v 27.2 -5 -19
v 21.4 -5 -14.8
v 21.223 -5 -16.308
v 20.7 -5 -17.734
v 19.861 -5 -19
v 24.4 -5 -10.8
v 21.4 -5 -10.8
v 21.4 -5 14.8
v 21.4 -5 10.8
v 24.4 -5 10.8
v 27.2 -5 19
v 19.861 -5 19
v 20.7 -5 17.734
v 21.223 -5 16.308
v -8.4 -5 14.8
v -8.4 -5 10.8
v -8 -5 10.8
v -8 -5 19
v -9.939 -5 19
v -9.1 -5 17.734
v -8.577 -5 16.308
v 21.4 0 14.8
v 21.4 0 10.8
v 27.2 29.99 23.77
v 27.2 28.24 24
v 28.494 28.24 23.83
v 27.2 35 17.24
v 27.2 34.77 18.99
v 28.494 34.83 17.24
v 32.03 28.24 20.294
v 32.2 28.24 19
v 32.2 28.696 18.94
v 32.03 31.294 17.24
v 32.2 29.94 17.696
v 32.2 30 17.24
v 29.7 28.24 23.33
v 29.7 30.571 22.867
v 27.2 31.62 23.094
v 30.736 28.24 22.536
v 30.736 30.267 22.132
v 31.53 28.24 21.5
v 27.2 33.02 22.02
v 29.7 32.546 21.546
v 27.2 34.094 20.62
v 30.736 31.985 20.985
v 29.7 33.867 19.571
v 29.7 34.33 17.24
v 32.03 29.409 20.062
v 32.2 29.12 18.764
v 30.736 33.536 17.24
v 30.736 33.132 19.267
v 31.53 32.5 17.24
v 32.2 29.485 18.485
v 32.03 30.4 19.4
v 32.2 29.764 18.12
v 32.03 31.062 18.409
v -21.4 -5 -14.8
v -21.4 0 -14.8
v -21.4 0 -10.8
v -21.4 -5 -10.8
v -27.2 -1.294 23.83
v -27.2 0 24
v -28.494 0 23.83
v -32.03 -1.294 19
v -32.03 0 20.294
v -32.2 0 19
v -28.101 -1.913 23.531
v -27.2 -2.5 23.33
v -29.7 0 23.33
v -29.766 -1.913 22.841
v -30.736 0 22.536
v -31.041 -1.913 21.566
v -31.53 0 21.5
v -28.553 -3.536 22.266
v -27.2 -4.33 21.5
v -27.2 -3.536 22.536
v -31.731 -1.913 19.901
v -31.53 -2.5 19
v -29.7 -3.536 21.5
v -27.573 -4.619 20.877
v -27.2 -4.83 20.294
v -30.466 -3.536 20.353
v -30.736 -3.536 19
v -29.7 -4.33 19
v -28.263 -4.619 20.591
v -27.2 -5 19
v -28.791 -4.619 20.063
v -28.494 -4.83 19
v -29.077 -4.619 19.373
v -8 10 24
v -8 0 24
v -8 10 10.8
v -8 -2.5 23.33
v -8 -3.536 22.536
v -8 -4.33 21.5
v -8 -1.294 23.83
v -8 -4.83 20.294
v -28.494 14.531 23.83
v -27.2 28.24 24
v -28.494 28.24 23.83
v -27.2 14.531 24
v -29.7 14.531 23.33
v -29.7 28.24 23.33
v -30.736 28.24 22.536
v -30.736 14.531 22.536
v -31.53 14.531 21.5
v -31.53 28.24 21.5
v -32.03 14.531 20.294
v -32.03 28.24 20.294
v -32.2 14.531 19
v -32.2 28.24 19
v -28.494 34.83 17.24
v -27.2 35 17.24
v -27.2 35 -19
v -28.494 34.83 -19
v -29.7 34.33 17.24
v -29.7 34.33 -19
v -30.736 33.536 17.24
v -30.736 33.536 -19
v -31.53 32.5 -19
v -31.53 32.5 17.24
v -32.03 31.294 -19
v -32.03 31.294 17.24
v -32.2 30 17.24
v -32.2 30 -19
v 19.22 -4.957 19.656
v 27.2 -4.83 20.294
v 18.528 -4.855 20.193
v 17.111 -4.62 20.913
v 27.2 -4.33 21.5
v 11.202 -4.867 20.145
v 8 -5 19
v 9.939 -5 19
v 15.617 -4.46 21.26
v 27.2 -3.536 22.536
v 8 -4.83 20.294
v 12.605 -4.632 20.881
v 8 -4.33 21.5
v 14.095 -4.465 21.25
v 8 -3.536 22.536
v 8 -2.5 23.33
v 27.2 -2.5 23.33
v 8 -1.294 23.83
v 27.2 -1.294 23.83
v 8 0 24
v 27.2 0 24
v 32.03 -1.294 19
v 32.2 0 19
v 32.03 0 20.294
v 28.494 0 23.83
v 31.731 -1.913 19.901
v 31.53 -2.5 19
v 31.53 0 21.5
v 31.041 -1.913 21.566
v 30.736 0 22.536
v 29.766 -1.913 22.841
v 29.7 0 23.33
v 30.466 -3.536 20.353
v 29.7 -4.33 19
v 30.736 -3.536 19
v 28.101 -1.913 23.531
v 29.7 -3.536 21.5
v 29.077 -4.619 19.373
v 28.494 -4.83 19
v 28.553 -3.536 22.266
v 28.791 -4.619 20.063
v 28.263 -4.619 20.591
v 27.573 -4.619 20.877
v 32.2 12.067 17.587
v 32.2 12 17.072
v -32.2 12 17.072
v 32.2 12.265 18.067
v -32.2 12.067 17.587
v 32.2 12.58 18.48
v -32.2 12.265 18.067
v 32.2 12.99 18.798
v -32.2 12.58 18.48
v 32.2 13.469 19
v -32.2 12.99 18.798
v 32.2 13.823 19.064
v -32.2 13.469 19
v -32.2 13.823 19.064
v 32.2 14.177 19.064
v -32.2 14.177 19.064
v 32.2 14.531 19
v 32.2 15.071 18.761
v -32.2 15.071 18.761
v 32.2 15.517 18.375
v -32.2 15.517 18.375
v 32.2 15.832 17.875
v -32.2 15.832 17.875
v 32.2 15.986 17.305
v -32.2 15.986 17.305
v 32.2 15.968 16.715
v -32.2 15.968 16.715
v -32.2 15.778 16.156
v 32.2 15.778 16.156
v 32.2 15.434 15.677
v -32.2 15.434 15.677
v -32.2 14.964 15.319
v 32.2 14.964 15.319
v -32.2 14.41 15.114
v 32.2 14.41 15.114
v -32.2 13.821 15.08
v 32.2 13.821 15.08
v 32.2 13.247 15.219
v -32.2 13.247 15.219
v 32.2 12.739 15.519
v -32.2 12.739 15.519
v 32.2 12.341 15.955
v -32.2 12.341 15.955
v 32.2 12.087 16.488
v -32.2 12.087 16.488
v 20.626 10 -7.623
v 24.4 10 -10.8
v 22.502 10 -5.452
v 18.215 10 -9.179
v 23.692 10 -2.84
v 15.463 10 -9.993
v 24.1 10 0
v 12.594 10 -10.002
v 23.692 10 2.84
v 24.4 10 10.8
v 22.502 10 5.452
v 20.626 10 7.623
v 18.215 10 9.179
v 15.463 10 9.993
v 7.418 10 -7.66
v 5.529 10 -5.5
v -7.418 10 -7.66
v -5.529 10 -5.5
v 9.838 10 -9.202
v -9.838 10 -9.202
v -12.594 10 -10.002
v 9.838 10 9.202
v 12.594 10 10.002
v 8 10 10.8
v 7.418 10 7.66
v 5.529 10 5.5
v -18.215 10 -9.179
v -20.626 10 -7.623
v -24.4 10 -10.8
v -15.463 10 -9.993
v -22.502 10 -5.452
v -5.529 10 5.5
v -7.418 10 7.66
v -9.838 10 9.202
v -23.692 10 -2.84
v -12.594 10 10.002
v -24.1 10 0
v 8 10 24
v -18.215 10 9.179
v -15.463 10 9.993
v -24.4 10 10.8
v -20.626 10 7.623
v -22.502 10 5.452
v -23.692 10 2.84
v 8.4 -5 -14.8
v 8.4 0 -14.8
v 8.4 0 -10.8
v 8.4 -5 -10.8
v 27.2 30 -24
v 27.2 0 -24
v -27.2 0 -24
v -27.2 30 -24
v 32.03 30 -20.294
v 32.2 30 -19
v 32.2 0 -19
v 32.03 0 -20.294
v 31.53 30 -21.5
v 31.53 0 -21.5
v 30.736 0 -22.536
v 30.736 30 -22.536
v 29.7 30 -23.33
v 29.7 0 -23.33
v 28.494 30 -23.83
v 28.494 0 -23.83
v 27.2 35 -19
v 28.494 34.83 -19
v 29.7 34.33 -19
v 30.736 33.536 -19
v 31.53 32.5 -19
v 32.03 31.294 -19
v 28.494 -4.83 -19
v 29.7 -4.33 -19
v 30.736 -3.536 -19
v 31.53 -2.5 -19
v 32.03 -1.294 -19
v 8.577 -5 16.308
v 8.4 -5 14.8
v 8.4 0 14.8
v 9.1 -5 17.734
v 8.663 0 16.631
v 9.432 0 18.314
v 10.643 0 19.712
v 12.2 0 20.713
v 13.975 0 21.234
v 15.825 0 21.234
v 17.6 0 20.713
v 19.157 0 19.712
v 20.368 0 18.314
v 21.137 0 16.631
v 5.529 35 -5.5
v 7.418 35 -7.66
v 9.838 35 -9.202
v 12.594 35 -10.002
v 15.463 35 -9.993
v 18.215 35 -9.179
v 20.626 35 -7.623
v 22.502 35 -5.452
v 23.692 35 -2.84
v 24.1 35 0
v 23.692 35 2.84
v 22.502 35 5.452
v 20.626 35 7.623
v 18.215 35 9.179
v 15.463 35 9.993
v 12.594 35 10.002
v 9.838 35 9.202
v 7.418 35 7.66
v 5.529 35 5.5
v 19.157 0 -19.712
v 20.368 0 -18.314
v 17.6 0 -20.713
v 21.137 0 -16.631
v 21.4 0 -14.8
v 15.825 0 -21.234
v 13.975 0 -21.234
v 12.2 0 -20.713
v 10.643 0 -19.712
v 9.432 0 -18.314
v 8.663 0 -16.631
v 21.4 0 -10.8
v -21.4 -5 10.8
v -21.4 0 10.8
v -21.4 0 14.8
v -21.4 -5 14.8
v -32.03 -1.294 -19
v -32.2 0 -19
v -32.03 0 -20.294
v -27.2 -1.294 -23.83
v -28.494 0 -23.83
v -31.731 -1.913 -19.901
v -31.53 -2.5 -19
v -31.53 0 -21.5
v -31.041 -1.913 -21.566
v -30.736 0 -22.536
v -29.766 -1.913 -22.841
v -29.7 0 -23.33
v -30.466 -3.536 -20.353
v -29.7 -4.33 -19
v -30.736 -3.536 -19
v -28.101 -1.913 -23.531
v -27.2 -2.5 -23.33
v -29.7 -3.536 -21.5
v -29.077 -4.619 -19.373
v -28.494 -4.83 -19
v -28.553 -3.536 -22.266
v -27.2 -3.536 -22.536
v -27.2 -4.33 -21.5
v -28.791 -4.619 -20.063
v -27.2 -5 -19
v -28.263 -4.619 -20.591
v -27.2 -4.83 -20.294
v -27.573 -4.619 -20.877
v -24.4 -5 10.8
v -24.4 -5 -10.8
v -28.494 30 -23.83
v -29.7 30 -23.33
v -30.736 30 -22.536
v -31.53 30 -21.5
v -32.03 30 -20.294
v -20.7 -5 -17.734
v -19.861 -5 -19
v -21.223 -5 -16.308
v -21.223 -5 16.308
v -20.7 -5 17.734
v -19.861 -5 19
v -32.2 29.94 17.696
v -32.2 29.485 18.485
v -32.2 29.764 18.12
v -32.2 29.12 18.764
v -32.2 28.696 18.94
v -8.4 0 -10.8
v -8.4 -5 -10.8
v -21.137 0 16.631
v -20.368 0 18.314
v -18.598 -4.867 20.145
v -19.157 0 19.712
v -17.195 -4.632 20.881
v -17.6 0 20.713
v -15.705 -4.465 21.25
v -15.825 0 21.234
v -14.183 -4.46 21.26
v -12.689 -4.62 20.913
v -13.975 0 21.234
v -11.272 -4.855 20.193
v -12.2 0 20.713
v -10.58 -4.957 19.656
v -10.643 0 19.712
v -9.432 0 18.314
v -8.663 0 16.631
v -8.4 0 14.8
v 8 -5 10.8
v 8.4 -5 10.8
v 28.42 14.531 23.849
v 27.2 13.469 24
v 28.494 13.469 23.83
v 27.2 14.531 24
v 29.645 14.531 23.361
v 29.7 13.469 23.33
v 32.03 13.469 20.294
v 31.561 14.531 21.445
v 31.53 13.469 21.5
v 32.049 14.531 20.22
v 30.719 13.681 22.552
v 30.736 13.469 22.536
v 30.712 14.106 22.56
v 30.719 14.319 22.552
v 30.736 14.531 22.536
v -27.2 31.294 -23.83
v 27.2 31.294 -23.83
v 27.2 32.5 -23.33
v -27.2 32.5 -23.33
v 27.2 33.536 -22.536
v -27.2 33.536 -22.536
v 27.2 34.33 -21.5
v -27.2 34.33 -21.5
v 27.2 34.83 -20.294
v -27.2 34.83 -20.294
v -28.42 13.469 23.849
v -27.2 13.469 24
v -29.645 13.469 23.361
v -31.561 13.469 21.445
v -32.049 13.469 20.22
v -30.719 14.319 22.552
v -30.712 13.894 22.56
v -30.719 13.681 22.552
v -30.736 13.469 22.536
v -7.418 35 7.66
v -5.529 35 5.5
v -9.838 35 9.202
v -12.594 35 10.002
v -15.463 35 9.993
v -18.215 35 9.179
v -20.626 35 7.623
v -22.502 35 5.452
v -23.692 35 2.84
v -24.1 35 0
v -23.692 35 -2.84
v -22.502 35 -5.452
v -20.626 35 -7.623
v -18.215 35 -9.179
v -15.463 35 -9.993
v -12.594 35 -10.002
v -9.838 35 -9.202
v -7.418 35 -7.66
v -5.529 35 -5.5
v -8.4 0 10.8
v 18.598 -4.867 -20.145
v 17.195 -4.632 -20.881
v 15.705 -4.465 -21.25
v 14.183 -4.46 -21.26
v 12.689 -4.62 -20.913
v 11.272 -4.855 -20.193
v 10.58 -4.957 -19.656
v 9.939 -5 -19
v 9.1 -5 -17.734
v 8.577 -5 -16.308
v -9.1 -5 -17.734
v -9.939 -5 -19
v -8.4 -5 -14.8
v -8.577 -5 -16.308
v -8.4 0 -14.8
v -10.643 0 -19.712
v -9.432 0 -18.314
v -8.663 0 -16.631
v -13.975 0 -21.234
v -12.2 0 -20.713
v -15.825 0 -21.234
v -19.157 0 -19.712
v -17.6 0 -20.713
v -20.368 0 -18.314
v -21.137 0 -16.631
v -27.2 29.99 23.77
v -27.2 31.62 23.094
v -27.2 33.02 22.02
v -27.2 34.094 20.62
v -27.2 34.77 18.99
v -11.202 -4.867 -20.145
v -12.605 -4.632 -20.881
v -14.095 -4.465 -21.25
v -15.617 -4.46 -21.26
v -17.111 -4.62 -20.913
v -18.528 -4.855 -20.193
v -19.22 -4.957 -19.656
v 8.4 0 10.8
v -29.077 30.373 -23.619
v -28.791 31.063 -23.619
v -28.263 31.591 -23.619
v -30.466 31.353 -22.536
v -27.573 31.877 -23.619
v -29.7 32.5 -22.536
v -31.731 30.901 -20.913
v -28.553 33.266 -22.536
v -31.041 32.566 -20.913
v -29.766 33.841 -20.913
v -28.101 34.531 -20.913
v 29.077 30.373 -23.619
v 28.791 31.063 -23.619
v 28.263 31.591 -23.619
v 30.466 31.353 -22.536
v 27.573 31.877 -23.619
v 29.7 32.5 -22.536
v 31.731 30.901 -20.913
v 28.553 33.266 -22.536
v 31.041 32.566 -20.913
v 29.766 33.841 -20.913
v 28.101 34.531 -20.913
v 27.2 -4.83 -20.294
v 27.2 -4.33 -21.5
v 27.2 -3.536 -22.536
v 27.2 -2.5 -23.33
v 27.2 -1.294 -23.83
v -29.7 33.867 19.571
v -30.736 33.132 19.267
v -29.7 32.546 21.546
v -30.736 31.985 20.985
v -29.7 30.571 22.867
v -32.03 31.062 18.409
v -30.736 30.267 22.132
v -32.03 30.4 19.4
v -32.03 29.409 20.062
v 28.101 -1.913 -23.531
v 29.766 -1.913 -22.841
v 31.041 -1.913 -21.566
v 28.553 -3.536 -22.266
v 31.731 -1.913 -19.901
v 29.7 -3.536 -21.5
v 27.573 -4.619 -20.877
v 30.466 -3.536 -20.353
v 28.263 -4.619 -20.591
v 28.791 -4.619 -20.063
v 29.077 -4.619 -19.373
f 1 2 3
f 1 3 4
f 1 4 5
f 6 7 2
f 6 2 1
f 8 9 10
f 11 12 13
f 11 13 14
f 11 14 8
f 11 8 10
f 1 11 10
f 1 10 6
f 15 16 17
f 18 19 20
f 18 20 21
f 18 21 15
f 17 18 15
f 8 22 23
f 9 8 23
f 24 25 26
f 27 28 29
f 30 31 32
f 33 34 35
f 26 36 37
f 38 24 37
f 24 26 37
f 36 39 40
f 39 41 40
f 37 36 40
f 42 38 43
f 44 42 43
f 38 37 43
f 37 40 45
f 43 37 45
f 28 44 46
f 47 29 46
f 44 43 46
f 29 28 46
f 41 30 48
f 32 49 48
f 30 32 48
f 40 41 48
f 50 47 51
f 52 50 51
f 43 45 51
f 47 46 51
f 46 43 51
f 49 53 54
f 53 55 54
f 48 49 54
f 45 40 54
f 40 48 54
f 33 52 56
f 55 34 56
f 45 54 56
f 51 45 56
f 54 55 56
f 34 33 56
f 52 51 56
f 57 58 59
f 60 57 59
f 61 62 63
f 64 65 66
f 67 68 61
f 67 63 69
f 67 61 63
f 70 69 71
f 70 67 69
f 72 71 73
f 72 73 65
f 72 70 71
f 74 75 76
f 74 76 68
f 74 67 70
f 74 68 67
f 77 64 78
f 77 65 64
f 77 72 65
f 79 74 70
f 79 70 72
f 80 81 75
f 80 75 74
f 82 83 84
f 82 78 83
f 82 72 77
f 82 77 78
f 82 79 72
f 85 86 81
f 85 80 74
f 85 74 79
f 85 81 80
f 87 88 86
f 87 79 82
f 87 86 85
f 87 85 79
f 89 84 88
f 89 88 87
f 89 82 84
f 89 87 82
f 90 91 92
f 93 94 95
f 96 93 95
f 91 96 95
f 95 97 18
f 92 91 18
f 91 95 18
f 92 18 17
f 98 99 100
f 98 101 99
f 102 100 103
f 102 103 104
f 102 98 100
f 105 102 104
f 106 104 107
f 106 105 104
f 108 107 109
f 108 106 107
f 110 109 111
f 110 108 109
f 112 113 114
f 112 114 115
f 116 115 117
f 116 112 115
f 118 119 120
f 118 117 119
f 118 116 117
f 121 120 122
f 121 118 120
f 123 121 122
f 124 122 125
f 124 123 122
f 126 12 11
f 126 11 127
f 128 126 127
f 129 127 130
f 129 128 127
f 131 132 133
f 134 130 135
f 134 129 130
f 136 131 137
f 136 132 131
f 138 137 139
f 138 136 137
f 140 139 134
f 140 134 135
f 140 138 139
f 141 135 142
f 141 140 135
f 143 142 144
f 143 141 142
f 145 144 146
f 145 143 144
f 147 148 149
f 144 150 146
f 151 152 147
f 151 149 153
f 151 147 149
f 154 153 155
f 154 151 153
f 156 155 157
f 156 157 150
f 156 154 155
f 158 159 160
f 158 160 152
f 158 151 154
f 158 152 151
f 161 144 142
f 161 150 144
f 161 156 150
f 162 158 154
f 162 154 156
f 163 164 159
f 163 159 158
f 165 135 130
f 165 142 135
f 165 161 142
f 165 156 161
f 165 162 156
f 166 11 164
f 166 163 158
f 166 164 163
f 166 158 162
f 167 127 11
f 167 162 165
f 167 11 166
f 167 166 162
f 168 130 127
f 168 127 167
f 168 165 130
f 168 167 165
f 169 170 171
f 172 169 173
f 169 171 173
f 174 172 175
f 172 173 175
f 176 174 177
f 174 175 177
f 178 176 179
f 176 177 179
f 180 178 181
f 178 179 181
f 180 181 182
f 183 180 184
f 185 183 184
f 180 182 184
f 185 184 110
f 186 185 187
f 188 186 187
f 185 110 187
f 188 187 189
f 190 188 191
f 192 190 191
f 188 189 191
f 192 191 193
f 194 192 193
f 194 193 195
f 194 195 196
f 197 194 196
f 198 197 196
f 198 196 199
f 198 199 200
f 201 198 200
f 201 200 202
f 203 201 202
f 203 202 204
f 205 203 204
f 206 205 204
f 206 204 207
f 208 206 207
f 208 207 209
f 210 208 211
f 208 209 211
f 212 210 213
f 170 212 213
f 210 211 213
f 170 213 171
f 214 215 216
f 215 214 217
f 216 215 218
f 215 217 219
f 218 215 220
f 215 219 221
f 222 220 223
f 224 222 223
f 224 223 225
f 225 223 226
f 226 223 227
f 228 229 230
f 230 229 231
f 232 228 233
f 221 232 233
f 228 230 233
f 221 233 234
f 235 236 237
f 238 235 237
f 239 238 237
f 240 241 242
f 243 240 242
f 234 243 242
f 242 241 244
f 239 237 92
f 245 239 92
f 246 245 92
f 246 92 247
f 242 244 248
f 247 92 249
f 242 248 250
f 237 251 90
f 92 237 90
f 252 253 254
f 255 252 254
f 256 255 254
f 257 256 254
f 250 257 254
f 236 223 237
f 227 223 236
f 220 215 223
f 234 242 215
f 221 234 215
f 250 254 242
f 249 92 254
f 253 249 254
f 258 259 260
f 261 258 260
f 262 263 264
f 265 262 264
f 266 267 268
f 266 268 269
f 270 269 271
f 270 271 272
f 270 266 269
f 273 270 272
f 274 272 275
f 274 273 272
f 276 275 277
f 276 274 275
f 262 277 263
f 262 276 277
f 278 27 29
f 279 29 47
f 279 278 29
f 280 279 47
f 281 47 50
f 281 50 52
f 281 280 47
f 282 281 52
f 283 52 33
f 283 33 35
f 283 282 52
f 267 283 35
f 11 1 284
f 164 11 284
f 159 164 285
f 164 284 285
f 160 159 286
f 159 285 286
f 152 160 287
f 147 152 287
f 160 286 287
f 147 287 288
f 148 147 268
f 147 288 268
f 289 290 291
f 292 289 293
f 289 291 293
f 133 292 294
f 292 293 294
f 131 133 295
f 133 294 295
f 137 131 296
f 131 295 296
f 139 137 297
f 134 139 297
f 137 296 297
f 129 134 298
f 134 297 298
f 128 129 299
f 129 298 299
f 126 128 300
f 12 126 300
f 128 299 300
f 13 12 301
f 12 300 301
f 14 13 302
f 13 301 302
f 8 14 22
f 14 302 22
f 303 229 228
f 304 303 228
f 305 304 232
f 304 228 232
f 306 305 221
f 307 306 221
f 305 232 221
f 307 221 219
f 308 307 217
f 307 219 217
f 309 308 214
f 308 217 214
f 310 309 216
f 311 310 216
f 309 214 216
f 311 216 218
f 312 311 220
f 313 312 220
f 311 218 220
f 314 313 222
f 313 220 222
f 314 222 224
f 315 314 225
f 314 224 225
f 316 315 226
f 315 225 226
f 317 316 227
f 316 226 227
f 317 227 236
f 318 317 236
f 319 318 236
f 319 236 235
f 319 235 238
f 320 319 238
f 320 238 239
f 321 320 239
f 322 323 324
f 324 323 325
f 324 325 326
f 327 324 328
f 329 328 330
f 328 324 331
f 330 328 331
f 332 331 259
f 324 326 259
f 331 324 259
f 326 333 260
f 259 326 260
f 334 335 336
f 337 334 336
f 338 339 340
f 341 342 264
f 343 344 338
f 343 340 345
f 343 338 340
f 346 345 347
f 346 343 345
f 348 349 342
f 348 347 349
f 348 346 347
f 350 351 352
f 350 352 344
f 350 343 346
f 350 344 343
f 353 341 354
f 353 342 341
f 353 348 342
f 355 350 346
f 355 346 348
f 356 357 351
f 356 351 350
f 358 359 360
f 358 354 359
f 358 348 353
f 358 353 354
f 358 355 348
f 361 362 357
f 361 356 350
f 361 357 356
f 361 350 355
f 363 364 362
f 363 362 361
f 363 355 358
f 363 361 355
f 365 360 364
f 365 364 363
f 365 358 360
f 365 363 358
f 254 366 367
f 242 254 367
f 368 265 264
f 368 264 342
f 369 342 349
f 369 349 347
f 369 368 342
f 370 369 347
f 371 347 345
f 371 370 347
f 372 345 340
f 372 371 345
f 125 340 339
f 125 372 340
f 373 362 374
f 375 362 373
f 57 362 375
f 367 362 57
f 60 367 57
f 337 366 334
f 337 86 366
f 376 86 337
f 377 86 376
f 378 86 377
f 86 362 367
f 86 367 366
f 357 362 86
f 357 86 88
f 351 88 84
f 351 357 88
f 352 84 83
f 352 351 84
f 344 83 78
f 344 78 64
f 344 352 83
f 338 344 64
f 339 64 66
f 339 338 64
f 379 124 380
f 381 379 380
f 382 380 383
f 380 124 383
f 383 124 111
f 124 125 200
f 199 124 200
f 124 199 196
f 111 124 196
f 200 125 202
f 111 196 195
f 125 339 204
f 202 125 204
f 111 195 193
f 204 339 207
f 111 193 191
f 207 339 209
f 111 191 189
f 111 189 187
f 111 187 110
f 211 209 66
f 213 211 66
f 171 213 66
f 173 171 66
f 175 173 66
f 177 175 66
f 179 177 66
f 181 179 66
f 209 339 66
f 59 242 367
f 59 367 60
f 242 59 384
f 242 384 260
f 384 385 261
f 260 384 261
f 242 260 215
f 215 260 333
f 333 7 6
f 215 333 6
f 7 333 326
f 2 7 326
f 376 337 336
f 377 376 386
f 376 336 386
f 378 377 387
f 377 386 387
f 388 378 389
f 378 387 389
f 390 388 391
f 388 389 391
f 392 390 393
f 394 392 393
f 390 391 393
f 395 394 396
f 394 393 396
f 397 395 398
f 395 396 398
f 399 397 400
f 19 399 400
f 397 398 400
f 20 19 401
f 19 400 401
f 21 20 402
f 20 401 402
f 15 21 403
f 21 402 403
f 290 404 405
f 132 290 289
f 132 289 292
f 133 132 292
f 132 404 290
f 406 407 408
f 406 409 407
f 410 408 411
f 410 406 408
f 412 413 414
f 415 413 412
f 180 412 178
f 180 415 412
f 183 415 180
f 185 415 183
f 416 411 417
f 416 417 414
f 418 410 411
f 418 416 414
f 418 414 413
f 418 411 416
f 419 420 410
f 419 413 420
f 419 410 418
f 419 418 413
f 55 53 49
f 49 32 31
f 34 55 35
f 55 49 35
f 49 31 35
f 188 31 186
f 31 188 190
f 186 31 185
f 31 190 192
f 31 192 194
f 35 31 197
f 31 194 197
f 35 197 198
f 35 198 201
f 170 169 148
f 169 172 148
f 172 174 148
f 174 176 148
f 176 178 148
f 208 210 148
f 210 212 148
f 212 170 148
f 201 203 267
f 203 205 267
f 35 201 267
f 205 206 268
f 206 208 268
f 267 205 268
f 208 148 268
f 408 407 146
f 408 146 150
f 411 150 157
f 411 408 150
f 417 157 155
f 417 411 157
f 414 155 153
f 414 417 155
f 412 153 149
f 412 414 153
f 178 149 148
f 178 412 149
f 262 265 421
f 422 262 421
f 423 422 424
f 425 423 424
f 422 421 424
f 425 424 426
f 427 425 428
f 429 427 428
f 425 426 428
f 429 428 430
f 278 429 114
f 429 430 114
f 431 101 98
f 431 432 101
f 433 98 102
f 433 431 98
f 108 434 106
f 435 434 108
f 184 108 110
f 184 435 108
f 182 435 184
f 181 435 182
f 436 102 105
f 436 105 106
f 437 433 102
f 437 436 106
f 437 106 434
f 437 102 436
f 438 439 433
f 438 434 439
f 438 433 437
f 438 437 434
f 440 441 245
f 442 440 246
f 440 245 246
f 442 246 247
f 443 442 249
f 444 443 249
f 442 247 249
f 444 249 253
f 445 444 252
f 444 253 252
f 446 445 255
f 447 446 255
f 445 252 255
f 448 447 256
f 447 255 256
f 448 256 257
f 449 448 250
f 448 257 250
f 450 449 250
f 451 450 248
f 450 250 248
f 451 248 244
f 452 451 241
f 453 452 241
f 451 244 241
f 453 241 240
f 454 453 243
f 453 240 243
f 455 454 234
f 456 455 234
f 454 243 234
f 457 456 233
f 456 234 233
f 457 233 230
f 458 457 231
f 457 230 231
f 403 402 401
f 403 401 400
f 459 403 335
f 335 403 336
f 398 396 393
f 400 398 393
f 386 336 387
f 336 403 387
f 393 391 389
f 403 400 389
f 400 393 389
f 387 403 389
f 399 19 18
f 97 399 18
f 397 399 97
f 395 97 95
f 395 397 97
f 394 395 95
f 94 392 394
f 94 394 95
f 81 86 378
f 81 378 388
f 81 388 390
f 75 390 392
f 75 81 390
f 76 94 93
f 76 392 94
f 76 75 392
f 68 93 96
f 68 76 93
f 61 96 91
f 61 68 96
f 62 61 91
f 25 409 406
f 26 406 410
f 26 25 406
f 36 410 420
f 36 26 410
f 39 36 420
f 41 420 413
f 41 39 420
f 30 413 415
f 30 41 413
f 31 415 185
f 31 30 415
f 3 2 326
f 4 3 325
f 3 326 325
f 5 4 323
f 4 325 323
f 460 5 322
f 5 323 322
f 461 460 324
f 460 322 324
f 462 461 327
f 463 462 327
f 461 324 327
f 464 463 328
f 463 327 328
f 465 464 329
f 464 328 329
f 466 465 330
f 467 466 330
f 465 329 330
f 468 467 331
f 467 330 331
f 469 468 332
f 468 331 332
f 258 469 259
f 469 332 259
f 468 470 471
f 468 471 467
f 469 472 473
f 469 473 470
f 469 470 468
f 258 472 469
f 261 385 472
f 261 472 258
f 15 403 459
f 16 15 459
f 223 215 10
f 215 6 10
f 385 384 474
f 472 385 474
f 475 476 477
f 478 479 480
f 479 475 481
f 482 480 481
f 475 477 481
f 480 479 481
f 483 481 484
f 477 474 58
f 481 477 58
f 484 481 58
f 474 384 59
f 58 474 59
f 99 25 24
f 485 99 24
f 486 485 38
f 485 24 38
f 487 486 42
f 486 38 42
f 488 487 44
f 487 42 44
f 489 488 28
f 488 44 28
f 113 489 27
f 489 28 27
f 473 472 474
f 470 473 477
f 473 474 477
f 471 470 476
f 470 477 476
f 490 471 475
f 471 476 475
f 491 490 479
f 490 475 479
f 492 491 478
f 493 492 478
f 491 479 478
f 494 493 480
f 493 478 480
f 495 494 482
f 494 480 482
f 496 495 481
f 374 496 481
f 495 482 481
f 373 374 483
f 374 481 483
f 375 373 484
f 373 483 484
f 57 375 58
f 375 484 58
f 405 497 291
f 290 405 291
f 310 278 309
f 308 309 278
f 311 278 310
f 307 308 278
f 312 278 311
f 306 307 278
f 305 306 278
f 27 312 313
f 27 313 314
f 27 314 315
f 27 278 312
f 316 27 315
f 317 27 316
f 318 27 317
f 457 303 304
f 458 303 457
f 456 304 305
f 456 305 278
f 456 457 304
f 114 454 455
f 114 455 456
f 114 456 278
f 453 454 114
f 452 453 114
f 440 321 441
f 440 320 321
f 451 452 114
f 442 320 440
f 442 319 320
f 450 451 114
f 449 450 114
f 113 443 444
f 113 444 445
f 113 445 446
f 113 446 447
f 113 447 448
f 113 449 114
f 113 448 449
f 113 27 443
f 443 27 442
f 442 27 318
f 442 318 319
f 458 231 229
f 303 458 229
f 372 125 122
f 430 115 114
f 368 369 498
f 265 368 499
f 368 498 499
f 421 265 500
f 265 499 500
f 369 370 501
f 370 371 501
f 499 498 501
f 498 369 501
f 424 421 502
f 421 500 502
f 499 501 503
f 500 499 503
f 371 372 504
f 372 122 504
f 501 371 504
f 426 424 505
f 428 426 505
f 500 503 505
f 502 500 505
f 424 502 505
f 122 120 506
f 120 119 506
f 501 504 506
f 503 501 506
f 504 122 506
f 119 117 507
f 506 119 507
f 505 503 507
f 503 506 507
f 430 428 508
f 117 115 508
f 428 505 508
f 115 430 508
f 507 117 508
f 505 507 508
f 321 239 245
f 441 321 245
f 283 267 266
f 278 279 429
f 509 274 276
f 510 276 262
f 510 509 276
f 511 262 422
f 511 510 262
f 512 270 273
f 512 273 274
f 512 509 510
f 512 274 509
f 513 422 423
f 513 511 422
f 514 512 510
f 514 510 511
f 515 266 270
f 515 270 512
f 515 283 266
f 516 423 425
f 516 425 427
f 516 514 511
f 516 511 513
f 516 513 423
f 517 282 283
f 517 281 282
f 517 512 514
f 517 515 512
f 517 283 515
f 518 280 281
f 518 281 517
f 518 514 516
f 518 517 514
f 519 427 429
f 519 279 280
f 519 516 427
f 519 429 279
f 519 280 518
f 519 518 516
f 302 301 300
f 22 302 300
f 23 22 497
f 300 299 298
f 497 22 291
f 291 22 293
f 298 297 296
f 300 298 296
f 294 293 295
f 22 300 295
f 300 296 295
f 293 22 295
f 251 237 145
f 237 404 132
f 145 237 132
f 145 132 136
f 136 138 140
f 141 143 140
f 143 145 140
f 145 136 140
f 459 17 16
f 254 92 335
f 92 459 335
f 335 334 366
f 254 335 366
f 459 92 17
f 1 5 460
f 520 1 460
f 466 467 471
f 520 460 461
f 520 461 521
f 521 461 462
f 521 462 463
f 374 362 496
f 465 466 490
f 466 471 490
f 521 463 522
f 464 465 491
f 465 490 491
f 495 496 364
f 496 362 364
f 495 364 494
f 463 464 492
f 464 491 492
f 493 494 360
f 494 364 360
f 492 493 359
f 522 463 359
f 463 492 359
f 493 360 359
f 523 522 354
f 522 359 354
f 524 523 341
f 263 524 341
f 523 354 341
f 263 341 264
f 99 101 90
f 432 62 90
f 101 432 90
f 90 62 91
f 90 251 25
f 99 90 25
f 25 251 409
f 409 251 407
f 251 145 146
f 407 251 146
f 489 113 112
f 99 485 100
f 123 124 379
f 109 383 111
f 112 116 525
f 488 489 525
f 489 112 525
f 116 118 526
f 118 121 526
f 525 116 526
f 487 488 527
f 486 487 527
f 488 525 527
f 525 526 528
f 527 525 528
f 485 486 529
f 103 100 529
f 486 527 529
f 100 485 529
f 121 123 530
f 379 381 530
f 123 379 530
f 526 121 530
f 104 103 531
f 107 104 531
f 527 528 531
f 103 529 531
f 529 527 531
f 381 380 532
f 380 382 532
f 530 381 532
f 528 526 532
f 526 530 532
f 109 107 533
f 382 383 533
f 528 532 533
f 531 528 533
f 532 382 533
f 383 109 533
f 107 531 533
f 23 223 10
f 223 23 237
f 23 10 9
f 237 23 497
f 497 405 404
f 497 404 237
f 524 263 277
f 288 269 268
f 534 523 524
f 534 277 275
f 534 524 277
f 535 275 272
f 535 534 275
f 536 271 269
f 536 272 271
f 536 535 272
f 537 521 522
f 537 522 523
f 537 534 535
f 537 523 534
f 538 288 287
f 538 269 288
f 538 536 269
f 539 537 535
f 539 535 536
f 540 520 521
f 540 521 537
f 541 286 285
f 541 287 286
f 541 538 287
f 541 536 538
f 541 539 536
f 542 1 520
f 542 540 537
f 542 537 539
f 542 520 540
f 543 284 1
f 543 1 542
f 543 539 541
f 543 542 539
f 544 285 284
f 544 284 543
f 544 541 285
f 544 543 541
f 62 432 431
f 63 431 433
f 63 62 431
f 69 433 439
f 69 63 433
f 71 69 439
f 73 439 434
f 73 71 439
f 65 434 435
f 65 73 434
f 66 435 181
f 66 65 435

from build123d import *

# Parameters (mm, degrees)
F1_DEPTH      = 5
F3_DEPTH      = 10
F5_DEPTH      = 25
F7_R          = 6.7597979746
F6_R          = 2
F8_DEPTH      = 69.4
F9_R          = 5
F10_R         = 5
F11_T1_DEPTH  = 44.2
F11_T3_DEPTH  = 44.2
F12_T1_DEPTH  = 54.4
F12_T3_DEPTH  = 30
F12_T5_DEPTH  = 38
F12_S9_W      = 5
F12_S9_H      = 5
F12_T10_DEPTH = 5
F12_S15_W     = 5
F12_S15_H     = 5
F12_T16_DEPTH = 5
F12_S21_W     = 5
F12_S21_H     = 5
F12_T22_DEPTH = 5
F12_S27_W     = 5
F12_S27_H     = 5
F12_T28_DEPTH = 5
F12_T32_ANGLE = 90
F12_T34_ANGLE = 90


# Not quite as in the source:
# - a fillet or chamfer that OpenCascade refuses, or shapes differently, is made with other operations: its cross-section is extruded or revolved along the edge and cut away or added


with BuildPart() as f1:
    # F0 (on Front) → F1 (new body)
    with BuildSketch(Plane.XZ):
        with BuildLine():
            Line((32.2, -24), (32.2, 24))
            Line((32.2, 24), (8, 24))
            Line((8, 24), (8, 10.8))
            Line((8, 10.8), (8.4, 10.8))
            Line((8.4, 10.8), (8.4, 14.8))
            ThreePointArc((8.4, 14.8), (14.9, 21.3), (21.4, 14.8))
            Line((21.4, 14.8), (21.4, 10.8))
            Line((21.4, 10.8), (24.4, 10.8))
            Line((24.4, 10.8), (24.4, -10.8))
            Line((24.4, -10.8), (21.4, -10.8))
            Line((21.4, -10.8), (21.4, -14.8))
            ThreePointArc((21.4, -14.8), (14.9, -21.3), (8.4, -14.8))
            Line((8.4, -14.8), (8.4, -10.8))
            Line((8.4, -10.8), (-8.4, -10.8))
            Line((-8.4, -10.8), (-8.4, -14.8))
            ThreePointArc((-8.4, -14.8), (-14.9, -21.3), (-21.4, -14.8))
            Line((-21.4, -14.8), (-21.4, -10.8))
            Line((-21.4, -10.8), (-24.4, -10.8))
            Line((-24.4, -10.8), (-24.4, 10.8))
            Line((-24.4, 10.8), (-21.4, 10.8))
            Line((-21.4, 10.8), (-21.4, 14.8))
            ThreePointArc((-21.4, 14.8), (-14.9, 21.3), (-8.4, 14.8))
            Line((-8.4, 14.8), (-8.4, 10.8))
            Line((-8.4, 10.8), (-8, 10.8))
            Line((-8, 10.8), (-8, 24))
            Line((-8, 24), (-32.2, 24))
            Line((-32.2, 24), (-32.2, -24))
            Line((-32.2, -24), (32.2, -24))
        make_face()
    extrude(amount=F1_DEPTH)

    # F2 (on face) → F3 (join)
    with BuildSketch(Plane(origin=(0, 0, 0), x_dir=(-1, 0, 0), z_dir=(0, 1, 0))):
        with BuildLine():
            Line((24.4, 10.8), (24.4, -10.8))
            Line((24.4, -10.8), (21.4, -10.8))
            Line((21.4, -10.8), (21.4, -14.8))
            ThreePointArc((21.4, -14.8), (14.9, -21.3), (8.4, -14.8))
            Line((8.4, -14.8), (8.4, -10.8))
            Line((8.4, -10.8), (-8.4, -10.8))
            Line((-8.4, -10.8), (-8.4, -14.8))
            ThreePointArc((-8.4, -14.8), (-14.9, -21.3), (-21.4, -14.8))
            Line((-21.4, -14.8), (-21.4, -10.8))
            Line((-21.4, -10.8), (-24.4, -10.8))
            Line((-24.4, -10.8), (-24.4, 10.8))
            Line((-24.4, 10.8), (-21.4, 10.8))
            Line((-21.4, 10.8), (-21.4, 14.8))
            ThreePointArc((-21.4, 14.8), (-14.9, 21.3), (-8.4, 14.8))
            Line((-8.4, 14.8), (-8.4, 10.8))
            Line((-8.4, 10.8), (-8, 10.8))
            Line((-8, 10.8), (-8, 24))
            Line((-8, 24), (-32.2, 24))
            Line((-32.2, 24), (-32.2, -24))
            Line((-32.2, -24), (32.2, -24))
            Line((32.2, -24), (32.2, 24))
            Line((32.2, 24), (8, 24))
            Line((8, 24), (8, 10.8))
            Line((8, 10.8), (8.4, 10.8))
            Line((8.4, 10.8), (8.4, 14.8))
            ThreePointArc((8.4, 14.8), (14.9, 21.3), (21.4, 14.8))
            Line((21.4, 14.8), (21.4, 10.8))
            Line((21.4, 10.8), (24.4, 10.8))
        make_face()
        with BuildLine():
            Line((21.4, -14.8), (21.4, -10.8))
            Line((21.4, -10.8), (8.4, -10.8))
            Line((8.4, -10.8), (8.4, -14.8))
            ThreePointArc((8.4, -14.8), (14.9, -21.3), (21.4, -14.8))
        make_face()
        with BuildLine():
            Line((-8.4, -14.8), (-8.4, -10.8))
            Line((-8.4, -10.8), (-21.4, -10.8))
            Line((-21.4, -10.8), (-21.4, -14.8))
            ThreePointArc((-21.4, -14.8), (-14.9, -21.3), (-8.4, -14.8))
        make_face()
        with BuildLine():
            Line((8.4, 10.8), (21.4, 10.8))
            Line((21.4, 10.8), (21.4, 14.8))
            ThreePointArc((21.4, 14.8), (14.9, 21.3), (8.4, 14.8))
            Line((8.4, 14.8), (8.4, 10.8))
        make_face()
        with BuildLine():
            Line((-21.4, 10.8), (-8.4, 10.8))
            Line((-8.4, 10.8), (-8.4, 14.8))
            ThreePointArc((-8.4, 14.8), (-14.9, 21.3), (-21.4, 14.8))
            Line((-21.4, 14.8), (-21.4, 10.8))
        make_face()
    extrude(amount=F3_DEPTH)

    # F4 (on face) → F5 (join)
    with BuildSketch(Plane(origin=(0, 10, 0), x_dir=(-1, 0, 0), z_dir=(0, 1, 0))):
        Polygon((32.2, -24), (32.2, 24), (8, 24), (8, 10.8), (24.4, 10.8), (24.4, -10.8), (-24.4, -10.8), (-24.4, 10.8), (-8, 10.8), (-8, 24), (-32.2, 24), (-32.2, -24), align=None)
        Polygon((8, 10.8), (8, 24), (-8, 24), (-8, 10.8), (-24.4, 10.8), (-24.4, -10.8), (24.4, -10.8), (24.4, 10.8), align=None)
        with BuildLine():
            ThreePointArc((5.5288725662, 5.5), (16.8680666762, 9.6842239514), (24.1, 0))
            ThreePointArc((24.1, 0), (16.8680666762, -9.6842239514), (5.5288725662, -5.5))
            Line((5.5288725662, -5.5), (0, -5.5))
            Line((0, -5.5), (-5.5288725662, -5.5))
            ThreePointArc((-5.5288725662, -5.5), (-24.1, 0), (-5.5288725662, 5.5))
            Line((-5.5288725662, 5.5), (0, 5.5))
            Line((0, 5.5), (5.5288725662, 5.5))
        make_face(mode=Mode.SUBTRACT)
    extrude(amount=F5_DEPTH)

    # F7
    f7_edges = [f1.edges().sort_by_distance(p)[0] for p in [
        (0, 35, 24),
    ]]
    fillet(f7_edges, radius=F7_R)

    # F6 (on face) → F8 (cut)
    with BuildSketch(Plane(origin=(-32.2, 0, 0), x_dir=(0, -1, 0), z_dir=(-1, 0, 0))):
        with Locations((-14, 17.0717967697)):
            Circle(F6_R)
    extrude(amount=-F8_DEPTH, mode=Mode.SUBTRACT)

    # F9
    f9_edges = [f1.edges().sort_by_distance(p)[0] for p in [
        (32.2, 33.020101, 22.020101),
        (32.2, 35, -3.379899),
    ]]
    fillet(f9_edges, radius=F9_R)

    # F10
    f10_edges = [f1.edges().sort_by_distance(p)[0] for p in [
        (-32.2, 35, -3.379899),
    ]]
    fillet(f10_edges, radius=F10_R)

    # F11: fillet of radius 5 on 2 edges, made by hand

    # F11_s2 → F11_t1 (cut)
    with BuildSketch(Plane.YZ.offset(-39.7)):
        with BuildLine():
            ThreePointArc((-5, 19), (-3.5355339059, 22.5355339059), (0, 24))
            Line((0, 24), (-5, 24))
            Line((-5, 24), (-5, 19))
        make_face()
    extrude(amount=F11_T1_DEPTH, mode=Mode.SUBTRACT)

    # F11_s4 → F11_t3 (cut)
    with BuildSketch(Plane.YZ.offset(-4.5)):
        with BuildLine():
            ThreePointArc((-5, 19), (-3.5355339059, 22.5355339059), (0, 24))
            Line((0, 24), (-5, 24))
            Line((-5, 24), (-5, 19))
        make_face()
    extrude(amount=F11_T3_DEPTH, mode=Mode.SUBTRACT)

    # F12: fillet of radius 5 on 8 edges, made by hand

    # F12_s2 → F12_t1 (cut)
    with BuildSketch(Plane.YZ.offset(-27.2)):
        with BuildLine():
            ThreePointArc((30, -24), (33.5355339059, -22.5355339059), (35, -19))
            Line((35, -19), (35, -24))
            Line((35, -24), (30, -24))
        make_face()
        with BuildLine():
            ThreePointArc((-5, -19), (-3.5355339059, -22.5355339059), (0, -24))
            Line((0, -24), (-5, -24))
            Line((-5, -24), (-5, -19))
        make_face()
    extrude(amount=F12_T1_DEPTH, mode=Mode.SUBTRACT)

    # F12_s4 → F12_t3 (cut)
    with BuildSketch(Plane.XZ.offset(-30)):
        with BuildLine():
            ThreePointArc((-27.2, -24), (-30.7355339059, -22.5355339059), (-32.2, -19))
            Line((-32.2, -19), (-32.2, -24))
            Line((-32.2, -24), (-27.2, -24))
        make_face()
        with BuildLine():
            ThreePointArc((32.2, -19), (30.7355339059, -22.5355339059), (27.2, -24))
            Line((27.2, -24), (32.2, -24))
            Line((32.2, -24), (32.2, -19))
        make_face()
    extrude(amount=F12_T3_DEPTH, mode=Mode.SUBTRACT)

    # F12_s6 → F12_t5 (cut)
    with BuildSketch(Plane.XY.offset(-19)):
        with BuildLine():
            ThreePointArc((27.2, -5), (30.7355339059, -3.5355339059), (32.2, 0))
            Line((32.2, 0), (32.2, -5))
            Line((32.2, -5), (27.2, -5))
        make_face()
        with BuildLine():
            ThreePointArc((-27.2, -5), (-30.7355339059, -3.5355339059), (-32.2, 0))
            Line((-32.2, 0), (-32.2, -5))
            Line((-32.2, -5), (-27.2, -5))
        make_face()
    extrude(amount=F12_T5_DEPTH, mode=Mode.SUBTRACT)


with BuildPart() as f12_tool8:
    # F12_s9 → F12_t10 (new body)
    with BuildSketch(Plane.XZ):
        with Locations((-29.7, 21.5)):
            Rectangle(F12_S9_W, F12_S9_H)
    extrude(amount=F12_T10_DEPTH)

    # F12_s11 → F12_t12 (revolve, cut)
    with BuildSketch(Plane(origin=(-27.2, 0, 19), x_dir=(0.7071067812, 0, -0.7071067812), z_dir=(-0.7071067812, 0, -0.7071067812))):
        with BuildLine():
            ThreePointArc((0, -5), (5, 0), (0, 5))
            Line((0, 5), (0, -5))
        make_face()
    revolve(axis=Axis((-27.2, 0, 19), (0, -1, 0)), mode=Mode.SUBTRACT)


with BuildPart() as f1_1:
    add(f1.part)

    # F12_t7: cut F12_tool8
    add(f12_tool8.part, mode=Mode.SUBTRACT)


with BuildPart() as f12_tool14:
    # F12_s15 → F12_t16 (new body)
    with BuildSketch(Plane.XZ):
        with Locations((29.7, 21.5)):
            Rectangle(F12_S15_W, F12_S15_H)
    extrude(amount=F12_T16_DEPTH)

    # F12_s17 → F12_t18 (revolve, cut)
    with BuildSketch(Plane(origin=(27.2, 0, 19), x_dir=(-0.7071067812, 0, -0.7071067812), z_dir=(-0.7071067812, 0, 0.7071067812))):
        with BuildLine():
            ThreePointArc((0, -5), (5, 0), (0, 5))
            Line((0, 5), (0, -5))
        make_face()
    revolve(axis=Axis((27.2, 0, 19), (0, -1, 0)), mode=Mode.SUBTRACT)


with BuildPart() as f1_2:
    add(f1_1.part)

    # F12_t13: cut F12_tool14
    add(f12_tool14.part, mode=Mode.SUBTRACT)


with BuildPart() as f12_tool20:
    # F12_s21 → F12_t22 (new body)
    with BuildSketch(Plane.XZ):
        with Locations((-29.7, -21.5)):
            Rectangle(F12_S21_W, F12_S21_H)
    extrude(amount=F12_T22_DEPTH)

    # F12_s23 → F12_t24 (revolve, cut)
    with BuildSketch(Plane(origin=(-27.2, 0, -19), x_dir=(0.7071067812, 0, 0.7071067812), z_dir=(0.7071067812, 0, -0.7071067812))):
        with BuildLine():
            ThreePointArc((0, -5), (5, 0), (0, 5))
            Line((0, 5), (0, -5))
        make_face()
    revolve(axis=Axis((-27.2, 0, -19), (0, -1, 0)), mode=Mode.SUBTRACT)


with BuildPart() as f1_3:
    add(f1_2.part)

    # F12_t19: cut F12_tool20
    add(f12_tool20.part, mode=Mode.SUBTRACT)


with BuildPart() as f12_tool26:
    # F12_s27 → F12_t28 (new body)
    with BuildSketch(Plane.XZ):
        with Locations((29.7, -21.5)):
            Rectangle(F12_S27_W, F12_S27_H)
    extrude(amount=F12_T28_DEPTH)

    # F12_s29 → F12_t30 (revolve, cut)
    with BuildSketch(Plane(origin=(27.2, 0, -19), x_dir=(-0.7071067812, 0, 0.7071067812), z_dir=(0.7071067812, 0, 0.7071067812))):
        with BuildLine():
            ThreePointArc((0, -5), (5, 0), (0, 5))
            Line((0, 5), (0, -5))
        make_face()
    revolve(axis=Axis((27.2, 0, -19), (0, -1, 0)), mode=Mode.SUBTRACT)


with BuildPart() as f1_4:
    add(f1_3.part)

    # F12_t25: cut F12_tool26
    add(f12_tool26.part, mode=Mode.SUBTRACT)

    # F12_s31 → F12_t32 (revolve, cut)
    with BuildSketch(Plane.XZ.offset(-30)):
        with BuildLine():
            ThreePointArc((-27.2, -24), (-30.7355339059, -22.5355339059), (-32.2, -19))
            Line((-32.2, -19), (-32.2, -24))
            Line((-32.2, -24), (-27.2, -24))
        make_face()
    revolve(axis=Axis((-27.2, 30, -24), (0, 0, -1)), revolution_arc=F12_T32_ANGLE, mode=Mode.SUBTRACT)

    # F12_s33 → F12_t34 (revolve, cut)
    with BuildSketch(Plane.XZ.offset(-30)):
        with BuildLine():
            ThreePointArc((27.2, -24), (30.7355339059, -22.5355339059), (32.2, -19))
            Line((32.2, -19), (32.2, -24))
            Line((32.2, -24), (27.2, -24))
        make_face()
    revolve(axis=Axis((27.2, 30, -24), (0, 0, 1)), revolution_arc=F12_T34_ANGLE, mode=Mode.SUBTRACT)


solid = f1_4.part
